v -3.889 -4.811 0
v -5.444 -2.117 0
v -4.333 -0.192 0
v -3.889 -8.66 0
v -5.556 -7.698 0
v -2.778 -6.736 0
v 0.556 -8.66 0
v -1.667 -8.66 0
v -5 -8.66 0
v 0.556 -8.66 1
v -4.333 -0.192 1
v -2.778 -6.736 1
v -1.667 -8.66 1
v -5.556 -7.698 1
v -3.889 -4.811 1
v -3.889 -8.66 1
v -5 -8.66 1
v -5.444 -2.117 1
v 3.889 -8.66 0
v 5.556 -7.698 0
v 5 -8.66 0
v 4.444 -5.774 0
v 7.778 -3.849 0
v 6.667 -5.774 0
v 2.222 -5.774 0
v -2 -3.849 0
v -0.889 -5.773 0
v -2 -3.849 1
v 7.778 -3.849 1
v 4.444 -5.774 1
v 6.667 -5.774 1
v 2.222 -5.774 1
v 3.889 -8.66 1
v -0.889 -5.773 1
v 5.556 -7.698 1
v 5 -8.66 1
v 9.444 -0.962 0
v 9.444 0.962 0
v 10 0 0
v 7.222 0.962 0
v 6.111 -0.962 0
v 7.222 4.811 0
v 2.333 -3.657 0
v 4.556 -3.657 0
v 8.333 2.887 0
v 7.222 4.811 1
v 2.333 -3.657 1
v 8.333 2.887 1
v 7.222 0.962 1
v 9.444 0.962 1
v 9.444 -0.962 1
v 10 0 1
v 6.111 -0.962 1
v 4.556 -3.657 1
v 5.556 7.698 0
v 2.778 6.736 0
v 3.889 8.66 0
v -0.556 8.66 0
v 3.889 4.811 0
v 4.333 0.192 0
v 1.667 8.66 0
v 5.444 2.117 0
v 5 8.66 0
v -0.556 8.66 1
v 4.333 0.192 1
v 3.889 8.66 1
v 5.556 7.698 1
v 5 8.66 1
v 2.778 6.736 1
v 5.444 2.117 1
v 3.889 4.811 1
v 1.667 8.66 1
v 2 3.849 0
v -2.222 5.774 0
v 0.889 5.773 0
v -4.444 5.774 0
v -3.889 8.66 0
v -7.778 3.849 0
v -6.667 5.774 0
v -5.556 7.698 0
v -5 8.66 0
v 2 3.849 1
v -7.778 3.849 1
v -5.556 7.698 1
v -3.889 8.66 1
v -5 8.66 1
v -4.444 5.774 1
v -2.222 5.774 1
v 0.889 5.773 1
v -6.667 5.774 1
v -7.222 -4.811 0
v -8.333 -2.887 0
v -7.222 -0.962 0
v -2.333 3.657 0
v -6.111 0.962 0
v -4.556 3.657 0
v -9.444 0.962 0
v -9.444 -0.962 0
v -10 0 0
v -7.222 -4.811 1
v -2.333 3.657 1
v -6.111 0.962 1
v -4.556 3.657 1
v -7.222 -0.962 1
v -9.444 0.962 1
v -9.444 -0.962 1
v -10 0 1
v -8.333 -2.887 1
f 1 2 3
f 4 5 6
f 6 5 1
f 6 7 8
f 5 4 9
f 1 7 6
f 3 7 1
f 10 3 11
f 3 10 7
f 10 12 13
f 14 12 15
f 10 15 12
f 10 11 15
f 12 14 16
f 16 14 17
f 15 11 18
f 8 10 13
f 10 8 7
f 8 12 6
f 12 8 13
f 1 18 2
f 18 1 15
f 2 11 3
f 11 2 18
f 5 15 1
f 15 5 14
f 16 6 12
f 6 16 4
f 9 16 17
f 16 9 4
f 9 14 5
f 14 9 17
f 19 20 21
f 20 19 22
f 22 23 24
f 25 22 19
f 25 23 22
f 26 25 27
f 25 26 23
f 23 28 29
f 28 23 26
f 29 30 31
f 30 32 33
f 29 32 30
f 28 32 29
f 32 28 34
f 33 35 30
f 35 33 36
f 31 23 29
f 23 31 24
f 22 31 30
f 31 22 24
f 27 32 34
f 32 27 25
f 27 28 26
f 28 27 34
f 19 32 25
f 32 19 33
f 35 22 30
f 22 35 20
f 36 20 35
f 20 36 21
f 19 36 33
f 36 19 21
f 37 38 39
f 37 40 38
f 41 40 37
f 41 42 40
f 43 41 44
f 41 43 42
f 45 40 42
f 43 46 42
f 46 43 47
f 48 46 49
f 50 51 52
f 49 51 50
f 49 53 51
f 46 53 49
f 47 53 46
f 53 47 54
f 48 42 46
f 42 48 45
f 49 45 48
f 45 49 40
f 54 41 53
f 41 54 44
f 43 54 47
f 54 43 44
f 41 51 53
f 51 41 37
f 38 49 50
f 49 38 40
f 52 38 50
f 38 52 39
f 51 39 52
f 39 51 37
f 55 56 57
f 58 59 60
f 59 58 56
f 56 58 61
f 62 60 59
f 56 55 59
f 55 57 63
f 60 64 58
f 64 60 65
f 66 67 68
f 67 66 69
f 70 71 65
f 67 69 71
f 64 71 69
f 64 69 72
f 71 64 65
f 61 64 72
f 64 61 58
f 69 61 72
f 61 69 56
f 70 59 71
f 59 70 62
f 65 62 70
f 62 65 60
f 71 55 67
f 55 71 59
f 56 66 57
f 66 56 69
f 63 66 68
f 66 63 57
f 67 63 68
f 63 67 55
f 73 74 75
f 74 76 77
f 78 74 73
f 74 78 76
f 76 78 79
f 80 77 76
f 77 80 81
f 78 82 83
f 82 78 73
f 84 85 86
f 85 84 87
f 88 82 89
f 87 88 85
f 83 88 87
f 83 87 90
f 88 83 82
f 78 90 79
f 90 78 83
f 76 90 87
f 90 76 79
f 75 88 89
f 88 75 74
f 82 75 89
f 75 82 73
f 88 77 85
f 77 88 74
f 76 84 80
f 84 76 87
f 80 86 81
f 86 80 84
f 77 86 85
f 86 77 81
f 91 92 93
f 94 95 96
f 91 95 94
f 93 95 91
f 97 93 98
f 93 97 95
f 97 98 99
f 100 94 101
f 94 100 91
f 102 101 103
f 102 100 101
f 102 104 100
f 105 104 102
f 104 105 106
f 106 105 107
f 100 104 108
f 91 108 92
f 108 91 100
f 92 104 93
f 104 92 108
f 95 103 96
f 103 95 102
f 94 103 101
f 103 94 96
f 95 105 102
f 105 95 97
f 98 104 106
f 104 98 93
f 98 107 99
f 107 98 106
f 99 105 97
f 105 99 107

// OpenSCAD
unit = [1, 0];
origin = [0, 0];


/*
    Returns a 2D rotation matrix given an angle.
*/
function rot2d(angle) = [
    [+cos(angle), -sin(angle)],
    [+sin(angle), +cos(angle)]
];


/*
    Calculates the points for a hexagon.
    Used to reference off of for creating the lambda.
*/
function inner_hex_points(data) = [
    for (angle = [0 : 60 : 300]) 
    dict_get(data, "scale") * rot2d(angle) * unit
];


/*
    Generates a hexagon solid.
    Used to intersect with the short lambda leg.
*/
module inner_hex(data) {
    linear_extrude(dict_get(data, "height"))
    polygon(inner_hex_points(data));
}


/*
    Calculates the points for making a lambda.
*/
function lambda_points(data) =
// lambda0 is the long leg and lambda1 is the short leg.
let (
    lambda0 = [
        inner_hex_points(data)[2]
        + dict_get(data, "thickness") * rot2d(60) * unit,
        inner_hex_points(data)[5]
        + dict_get(data, "thickness") * rot2d(0) * unit,
        inner_hex_points(data)[5]
        + dict_get(data, "thickness") * rot2d(180) * unit,
        inner_hex_points(data)[2]
        + dict_get(data, "thickness") * rot2d(240) * unit,
    ],
    lambda1 = [
        origin
        + dict_get(data, "thickness") * rot2d(60) * unit
        + dict_get(data, "thickness") * rot2d(120) * unit,
        origin
        + dict_get(data, "thickness") * rot2d(60) * unit
        + dict_get(data, "thickness") * rot2d(-60) * unit,
        inner_hex_points(data)[4]
        + dict_get(data, "thickness") * rot2d(0) * unit,
        inner_hex_points(data)[4]
        + dict_get(data, "thickness") * rot2d(180) * unit,
    ]
)
[lambda0, lambda1];


/*
    Calculates the points for making a gap between lambdas.
*/
function gap_points(data) = [
    inner_hex_points(data)[2]
    + dict_get(data, "thickness") * rot2d(60) * unit
    + dict_get(data, "gap") * rot2d(90) * unit,
    inner_hex_points(data)[2]
    + dict_get(data, "thickness") * rot2d(60) * unit
    + dict_get(data, "gap") * rot2d(-60) * unit,
    inner_hex_points(data)[2]
    + dict_get(data, "thickness") * rot2d(240) * unit
    + dict_get(data, "gap") * rot2d(-60) * unit,
    inner_hex_points(data)[2]
    + dict_get(data, "thickness") * rot2d(240) * unit
    + dict_get(data, "gap") * rot2d(180) * unit,
];


/*
    Generates a single lambda at the origin.
*/
module lambda(data) {
    union() {
        if (dict_get(data, "gap") == 0) {
            linear_extrude(dict_get(data, "height")) polygon(lambda_points(data)[0]);
        } else
        {
            difference() {
                linear_extrude(dict_get(data, "height")) polygon(lambda_points(data)[0]);
                linear_extrude(4 * dict_get(data, "height"), center=true) polygon(gap_points(data));
            }
        }
        intersection() {
            linear_extrude(dict_get(data, "height")) polygon(lambda_points(data)[1]);
            inner_hex(data);
        }
    }
}


/*
    Generates a NixOS flake.
*/
module flake(data) {
    new_data = update_params(data);
    for (idx = [0 : 5]) {
        rotate([0, 0, idx * 60]) 
        translate(-lambda_points(new_data)[0][0])
        translate([-dict_get(new_data, "scale"), 0, 0])
        lambda(new_data);
    }
}


/*
    Returns the value from a associative array/dictionary type structure given some key.

    Values can be of any type.
    The dictionary must of be of the form:
    [
        [ "key0", <value0> ],
        [ "key1", <value1> ],
        ...
    ]
*/
function dict_get(dict, key) =
  dict[search([key], dict)[0]][1];


/*
    Updates the user parameters so the flake is unit size when `scale = 1`.
*/
function update_params(data) = let
    // factor was empirically found. It gives a flake that is circumscribed by the unit circle.
    (factor = 2.25) [
    [ "gap", dict_get(data, "scale") * dict_get(data, "gap") / factor ],
    [ "height", dict_get(data, "height") ],
    [ "scale", dict_get(data, "scale") / factor ],
    [ "thickness", dict_get(data, "scale") * dict_get(data, "thickness") / factor ],
];


/*
    The parameters for generating a NixOS flake.

    `gap` - The gap between lambdas.
    `height` - The z-height of the flake.
    `scale` - The radial (x,y) size of the flake.
    `thickness` - The thickness of the lambda legs.

    `scale` updates `gap` and `thcikness` so there is no need to compesate these values.
    A `gap` of 0 will leave no gap between the lambdas.
    A `gap` of 1 will remove the top portion of the long lambda leg until the point where the two lambda legs intersect.

    A `gap` of 0.05 to 0.1 is a good value for replicating the official NixOS flake.
    A `thickness` of 0.25 is a good value for replicating the official NixOS flake.
    OpenSCAD doesn't have a concept of units so use `scale` and `height` values in the desired ratio.
*/
params = [
    [ "gap", 0.05 ],
    [ "height", 1 ],
    [ "scale", 10 ],
    [ "thickness", 0.25 ],
];


flake(params);
